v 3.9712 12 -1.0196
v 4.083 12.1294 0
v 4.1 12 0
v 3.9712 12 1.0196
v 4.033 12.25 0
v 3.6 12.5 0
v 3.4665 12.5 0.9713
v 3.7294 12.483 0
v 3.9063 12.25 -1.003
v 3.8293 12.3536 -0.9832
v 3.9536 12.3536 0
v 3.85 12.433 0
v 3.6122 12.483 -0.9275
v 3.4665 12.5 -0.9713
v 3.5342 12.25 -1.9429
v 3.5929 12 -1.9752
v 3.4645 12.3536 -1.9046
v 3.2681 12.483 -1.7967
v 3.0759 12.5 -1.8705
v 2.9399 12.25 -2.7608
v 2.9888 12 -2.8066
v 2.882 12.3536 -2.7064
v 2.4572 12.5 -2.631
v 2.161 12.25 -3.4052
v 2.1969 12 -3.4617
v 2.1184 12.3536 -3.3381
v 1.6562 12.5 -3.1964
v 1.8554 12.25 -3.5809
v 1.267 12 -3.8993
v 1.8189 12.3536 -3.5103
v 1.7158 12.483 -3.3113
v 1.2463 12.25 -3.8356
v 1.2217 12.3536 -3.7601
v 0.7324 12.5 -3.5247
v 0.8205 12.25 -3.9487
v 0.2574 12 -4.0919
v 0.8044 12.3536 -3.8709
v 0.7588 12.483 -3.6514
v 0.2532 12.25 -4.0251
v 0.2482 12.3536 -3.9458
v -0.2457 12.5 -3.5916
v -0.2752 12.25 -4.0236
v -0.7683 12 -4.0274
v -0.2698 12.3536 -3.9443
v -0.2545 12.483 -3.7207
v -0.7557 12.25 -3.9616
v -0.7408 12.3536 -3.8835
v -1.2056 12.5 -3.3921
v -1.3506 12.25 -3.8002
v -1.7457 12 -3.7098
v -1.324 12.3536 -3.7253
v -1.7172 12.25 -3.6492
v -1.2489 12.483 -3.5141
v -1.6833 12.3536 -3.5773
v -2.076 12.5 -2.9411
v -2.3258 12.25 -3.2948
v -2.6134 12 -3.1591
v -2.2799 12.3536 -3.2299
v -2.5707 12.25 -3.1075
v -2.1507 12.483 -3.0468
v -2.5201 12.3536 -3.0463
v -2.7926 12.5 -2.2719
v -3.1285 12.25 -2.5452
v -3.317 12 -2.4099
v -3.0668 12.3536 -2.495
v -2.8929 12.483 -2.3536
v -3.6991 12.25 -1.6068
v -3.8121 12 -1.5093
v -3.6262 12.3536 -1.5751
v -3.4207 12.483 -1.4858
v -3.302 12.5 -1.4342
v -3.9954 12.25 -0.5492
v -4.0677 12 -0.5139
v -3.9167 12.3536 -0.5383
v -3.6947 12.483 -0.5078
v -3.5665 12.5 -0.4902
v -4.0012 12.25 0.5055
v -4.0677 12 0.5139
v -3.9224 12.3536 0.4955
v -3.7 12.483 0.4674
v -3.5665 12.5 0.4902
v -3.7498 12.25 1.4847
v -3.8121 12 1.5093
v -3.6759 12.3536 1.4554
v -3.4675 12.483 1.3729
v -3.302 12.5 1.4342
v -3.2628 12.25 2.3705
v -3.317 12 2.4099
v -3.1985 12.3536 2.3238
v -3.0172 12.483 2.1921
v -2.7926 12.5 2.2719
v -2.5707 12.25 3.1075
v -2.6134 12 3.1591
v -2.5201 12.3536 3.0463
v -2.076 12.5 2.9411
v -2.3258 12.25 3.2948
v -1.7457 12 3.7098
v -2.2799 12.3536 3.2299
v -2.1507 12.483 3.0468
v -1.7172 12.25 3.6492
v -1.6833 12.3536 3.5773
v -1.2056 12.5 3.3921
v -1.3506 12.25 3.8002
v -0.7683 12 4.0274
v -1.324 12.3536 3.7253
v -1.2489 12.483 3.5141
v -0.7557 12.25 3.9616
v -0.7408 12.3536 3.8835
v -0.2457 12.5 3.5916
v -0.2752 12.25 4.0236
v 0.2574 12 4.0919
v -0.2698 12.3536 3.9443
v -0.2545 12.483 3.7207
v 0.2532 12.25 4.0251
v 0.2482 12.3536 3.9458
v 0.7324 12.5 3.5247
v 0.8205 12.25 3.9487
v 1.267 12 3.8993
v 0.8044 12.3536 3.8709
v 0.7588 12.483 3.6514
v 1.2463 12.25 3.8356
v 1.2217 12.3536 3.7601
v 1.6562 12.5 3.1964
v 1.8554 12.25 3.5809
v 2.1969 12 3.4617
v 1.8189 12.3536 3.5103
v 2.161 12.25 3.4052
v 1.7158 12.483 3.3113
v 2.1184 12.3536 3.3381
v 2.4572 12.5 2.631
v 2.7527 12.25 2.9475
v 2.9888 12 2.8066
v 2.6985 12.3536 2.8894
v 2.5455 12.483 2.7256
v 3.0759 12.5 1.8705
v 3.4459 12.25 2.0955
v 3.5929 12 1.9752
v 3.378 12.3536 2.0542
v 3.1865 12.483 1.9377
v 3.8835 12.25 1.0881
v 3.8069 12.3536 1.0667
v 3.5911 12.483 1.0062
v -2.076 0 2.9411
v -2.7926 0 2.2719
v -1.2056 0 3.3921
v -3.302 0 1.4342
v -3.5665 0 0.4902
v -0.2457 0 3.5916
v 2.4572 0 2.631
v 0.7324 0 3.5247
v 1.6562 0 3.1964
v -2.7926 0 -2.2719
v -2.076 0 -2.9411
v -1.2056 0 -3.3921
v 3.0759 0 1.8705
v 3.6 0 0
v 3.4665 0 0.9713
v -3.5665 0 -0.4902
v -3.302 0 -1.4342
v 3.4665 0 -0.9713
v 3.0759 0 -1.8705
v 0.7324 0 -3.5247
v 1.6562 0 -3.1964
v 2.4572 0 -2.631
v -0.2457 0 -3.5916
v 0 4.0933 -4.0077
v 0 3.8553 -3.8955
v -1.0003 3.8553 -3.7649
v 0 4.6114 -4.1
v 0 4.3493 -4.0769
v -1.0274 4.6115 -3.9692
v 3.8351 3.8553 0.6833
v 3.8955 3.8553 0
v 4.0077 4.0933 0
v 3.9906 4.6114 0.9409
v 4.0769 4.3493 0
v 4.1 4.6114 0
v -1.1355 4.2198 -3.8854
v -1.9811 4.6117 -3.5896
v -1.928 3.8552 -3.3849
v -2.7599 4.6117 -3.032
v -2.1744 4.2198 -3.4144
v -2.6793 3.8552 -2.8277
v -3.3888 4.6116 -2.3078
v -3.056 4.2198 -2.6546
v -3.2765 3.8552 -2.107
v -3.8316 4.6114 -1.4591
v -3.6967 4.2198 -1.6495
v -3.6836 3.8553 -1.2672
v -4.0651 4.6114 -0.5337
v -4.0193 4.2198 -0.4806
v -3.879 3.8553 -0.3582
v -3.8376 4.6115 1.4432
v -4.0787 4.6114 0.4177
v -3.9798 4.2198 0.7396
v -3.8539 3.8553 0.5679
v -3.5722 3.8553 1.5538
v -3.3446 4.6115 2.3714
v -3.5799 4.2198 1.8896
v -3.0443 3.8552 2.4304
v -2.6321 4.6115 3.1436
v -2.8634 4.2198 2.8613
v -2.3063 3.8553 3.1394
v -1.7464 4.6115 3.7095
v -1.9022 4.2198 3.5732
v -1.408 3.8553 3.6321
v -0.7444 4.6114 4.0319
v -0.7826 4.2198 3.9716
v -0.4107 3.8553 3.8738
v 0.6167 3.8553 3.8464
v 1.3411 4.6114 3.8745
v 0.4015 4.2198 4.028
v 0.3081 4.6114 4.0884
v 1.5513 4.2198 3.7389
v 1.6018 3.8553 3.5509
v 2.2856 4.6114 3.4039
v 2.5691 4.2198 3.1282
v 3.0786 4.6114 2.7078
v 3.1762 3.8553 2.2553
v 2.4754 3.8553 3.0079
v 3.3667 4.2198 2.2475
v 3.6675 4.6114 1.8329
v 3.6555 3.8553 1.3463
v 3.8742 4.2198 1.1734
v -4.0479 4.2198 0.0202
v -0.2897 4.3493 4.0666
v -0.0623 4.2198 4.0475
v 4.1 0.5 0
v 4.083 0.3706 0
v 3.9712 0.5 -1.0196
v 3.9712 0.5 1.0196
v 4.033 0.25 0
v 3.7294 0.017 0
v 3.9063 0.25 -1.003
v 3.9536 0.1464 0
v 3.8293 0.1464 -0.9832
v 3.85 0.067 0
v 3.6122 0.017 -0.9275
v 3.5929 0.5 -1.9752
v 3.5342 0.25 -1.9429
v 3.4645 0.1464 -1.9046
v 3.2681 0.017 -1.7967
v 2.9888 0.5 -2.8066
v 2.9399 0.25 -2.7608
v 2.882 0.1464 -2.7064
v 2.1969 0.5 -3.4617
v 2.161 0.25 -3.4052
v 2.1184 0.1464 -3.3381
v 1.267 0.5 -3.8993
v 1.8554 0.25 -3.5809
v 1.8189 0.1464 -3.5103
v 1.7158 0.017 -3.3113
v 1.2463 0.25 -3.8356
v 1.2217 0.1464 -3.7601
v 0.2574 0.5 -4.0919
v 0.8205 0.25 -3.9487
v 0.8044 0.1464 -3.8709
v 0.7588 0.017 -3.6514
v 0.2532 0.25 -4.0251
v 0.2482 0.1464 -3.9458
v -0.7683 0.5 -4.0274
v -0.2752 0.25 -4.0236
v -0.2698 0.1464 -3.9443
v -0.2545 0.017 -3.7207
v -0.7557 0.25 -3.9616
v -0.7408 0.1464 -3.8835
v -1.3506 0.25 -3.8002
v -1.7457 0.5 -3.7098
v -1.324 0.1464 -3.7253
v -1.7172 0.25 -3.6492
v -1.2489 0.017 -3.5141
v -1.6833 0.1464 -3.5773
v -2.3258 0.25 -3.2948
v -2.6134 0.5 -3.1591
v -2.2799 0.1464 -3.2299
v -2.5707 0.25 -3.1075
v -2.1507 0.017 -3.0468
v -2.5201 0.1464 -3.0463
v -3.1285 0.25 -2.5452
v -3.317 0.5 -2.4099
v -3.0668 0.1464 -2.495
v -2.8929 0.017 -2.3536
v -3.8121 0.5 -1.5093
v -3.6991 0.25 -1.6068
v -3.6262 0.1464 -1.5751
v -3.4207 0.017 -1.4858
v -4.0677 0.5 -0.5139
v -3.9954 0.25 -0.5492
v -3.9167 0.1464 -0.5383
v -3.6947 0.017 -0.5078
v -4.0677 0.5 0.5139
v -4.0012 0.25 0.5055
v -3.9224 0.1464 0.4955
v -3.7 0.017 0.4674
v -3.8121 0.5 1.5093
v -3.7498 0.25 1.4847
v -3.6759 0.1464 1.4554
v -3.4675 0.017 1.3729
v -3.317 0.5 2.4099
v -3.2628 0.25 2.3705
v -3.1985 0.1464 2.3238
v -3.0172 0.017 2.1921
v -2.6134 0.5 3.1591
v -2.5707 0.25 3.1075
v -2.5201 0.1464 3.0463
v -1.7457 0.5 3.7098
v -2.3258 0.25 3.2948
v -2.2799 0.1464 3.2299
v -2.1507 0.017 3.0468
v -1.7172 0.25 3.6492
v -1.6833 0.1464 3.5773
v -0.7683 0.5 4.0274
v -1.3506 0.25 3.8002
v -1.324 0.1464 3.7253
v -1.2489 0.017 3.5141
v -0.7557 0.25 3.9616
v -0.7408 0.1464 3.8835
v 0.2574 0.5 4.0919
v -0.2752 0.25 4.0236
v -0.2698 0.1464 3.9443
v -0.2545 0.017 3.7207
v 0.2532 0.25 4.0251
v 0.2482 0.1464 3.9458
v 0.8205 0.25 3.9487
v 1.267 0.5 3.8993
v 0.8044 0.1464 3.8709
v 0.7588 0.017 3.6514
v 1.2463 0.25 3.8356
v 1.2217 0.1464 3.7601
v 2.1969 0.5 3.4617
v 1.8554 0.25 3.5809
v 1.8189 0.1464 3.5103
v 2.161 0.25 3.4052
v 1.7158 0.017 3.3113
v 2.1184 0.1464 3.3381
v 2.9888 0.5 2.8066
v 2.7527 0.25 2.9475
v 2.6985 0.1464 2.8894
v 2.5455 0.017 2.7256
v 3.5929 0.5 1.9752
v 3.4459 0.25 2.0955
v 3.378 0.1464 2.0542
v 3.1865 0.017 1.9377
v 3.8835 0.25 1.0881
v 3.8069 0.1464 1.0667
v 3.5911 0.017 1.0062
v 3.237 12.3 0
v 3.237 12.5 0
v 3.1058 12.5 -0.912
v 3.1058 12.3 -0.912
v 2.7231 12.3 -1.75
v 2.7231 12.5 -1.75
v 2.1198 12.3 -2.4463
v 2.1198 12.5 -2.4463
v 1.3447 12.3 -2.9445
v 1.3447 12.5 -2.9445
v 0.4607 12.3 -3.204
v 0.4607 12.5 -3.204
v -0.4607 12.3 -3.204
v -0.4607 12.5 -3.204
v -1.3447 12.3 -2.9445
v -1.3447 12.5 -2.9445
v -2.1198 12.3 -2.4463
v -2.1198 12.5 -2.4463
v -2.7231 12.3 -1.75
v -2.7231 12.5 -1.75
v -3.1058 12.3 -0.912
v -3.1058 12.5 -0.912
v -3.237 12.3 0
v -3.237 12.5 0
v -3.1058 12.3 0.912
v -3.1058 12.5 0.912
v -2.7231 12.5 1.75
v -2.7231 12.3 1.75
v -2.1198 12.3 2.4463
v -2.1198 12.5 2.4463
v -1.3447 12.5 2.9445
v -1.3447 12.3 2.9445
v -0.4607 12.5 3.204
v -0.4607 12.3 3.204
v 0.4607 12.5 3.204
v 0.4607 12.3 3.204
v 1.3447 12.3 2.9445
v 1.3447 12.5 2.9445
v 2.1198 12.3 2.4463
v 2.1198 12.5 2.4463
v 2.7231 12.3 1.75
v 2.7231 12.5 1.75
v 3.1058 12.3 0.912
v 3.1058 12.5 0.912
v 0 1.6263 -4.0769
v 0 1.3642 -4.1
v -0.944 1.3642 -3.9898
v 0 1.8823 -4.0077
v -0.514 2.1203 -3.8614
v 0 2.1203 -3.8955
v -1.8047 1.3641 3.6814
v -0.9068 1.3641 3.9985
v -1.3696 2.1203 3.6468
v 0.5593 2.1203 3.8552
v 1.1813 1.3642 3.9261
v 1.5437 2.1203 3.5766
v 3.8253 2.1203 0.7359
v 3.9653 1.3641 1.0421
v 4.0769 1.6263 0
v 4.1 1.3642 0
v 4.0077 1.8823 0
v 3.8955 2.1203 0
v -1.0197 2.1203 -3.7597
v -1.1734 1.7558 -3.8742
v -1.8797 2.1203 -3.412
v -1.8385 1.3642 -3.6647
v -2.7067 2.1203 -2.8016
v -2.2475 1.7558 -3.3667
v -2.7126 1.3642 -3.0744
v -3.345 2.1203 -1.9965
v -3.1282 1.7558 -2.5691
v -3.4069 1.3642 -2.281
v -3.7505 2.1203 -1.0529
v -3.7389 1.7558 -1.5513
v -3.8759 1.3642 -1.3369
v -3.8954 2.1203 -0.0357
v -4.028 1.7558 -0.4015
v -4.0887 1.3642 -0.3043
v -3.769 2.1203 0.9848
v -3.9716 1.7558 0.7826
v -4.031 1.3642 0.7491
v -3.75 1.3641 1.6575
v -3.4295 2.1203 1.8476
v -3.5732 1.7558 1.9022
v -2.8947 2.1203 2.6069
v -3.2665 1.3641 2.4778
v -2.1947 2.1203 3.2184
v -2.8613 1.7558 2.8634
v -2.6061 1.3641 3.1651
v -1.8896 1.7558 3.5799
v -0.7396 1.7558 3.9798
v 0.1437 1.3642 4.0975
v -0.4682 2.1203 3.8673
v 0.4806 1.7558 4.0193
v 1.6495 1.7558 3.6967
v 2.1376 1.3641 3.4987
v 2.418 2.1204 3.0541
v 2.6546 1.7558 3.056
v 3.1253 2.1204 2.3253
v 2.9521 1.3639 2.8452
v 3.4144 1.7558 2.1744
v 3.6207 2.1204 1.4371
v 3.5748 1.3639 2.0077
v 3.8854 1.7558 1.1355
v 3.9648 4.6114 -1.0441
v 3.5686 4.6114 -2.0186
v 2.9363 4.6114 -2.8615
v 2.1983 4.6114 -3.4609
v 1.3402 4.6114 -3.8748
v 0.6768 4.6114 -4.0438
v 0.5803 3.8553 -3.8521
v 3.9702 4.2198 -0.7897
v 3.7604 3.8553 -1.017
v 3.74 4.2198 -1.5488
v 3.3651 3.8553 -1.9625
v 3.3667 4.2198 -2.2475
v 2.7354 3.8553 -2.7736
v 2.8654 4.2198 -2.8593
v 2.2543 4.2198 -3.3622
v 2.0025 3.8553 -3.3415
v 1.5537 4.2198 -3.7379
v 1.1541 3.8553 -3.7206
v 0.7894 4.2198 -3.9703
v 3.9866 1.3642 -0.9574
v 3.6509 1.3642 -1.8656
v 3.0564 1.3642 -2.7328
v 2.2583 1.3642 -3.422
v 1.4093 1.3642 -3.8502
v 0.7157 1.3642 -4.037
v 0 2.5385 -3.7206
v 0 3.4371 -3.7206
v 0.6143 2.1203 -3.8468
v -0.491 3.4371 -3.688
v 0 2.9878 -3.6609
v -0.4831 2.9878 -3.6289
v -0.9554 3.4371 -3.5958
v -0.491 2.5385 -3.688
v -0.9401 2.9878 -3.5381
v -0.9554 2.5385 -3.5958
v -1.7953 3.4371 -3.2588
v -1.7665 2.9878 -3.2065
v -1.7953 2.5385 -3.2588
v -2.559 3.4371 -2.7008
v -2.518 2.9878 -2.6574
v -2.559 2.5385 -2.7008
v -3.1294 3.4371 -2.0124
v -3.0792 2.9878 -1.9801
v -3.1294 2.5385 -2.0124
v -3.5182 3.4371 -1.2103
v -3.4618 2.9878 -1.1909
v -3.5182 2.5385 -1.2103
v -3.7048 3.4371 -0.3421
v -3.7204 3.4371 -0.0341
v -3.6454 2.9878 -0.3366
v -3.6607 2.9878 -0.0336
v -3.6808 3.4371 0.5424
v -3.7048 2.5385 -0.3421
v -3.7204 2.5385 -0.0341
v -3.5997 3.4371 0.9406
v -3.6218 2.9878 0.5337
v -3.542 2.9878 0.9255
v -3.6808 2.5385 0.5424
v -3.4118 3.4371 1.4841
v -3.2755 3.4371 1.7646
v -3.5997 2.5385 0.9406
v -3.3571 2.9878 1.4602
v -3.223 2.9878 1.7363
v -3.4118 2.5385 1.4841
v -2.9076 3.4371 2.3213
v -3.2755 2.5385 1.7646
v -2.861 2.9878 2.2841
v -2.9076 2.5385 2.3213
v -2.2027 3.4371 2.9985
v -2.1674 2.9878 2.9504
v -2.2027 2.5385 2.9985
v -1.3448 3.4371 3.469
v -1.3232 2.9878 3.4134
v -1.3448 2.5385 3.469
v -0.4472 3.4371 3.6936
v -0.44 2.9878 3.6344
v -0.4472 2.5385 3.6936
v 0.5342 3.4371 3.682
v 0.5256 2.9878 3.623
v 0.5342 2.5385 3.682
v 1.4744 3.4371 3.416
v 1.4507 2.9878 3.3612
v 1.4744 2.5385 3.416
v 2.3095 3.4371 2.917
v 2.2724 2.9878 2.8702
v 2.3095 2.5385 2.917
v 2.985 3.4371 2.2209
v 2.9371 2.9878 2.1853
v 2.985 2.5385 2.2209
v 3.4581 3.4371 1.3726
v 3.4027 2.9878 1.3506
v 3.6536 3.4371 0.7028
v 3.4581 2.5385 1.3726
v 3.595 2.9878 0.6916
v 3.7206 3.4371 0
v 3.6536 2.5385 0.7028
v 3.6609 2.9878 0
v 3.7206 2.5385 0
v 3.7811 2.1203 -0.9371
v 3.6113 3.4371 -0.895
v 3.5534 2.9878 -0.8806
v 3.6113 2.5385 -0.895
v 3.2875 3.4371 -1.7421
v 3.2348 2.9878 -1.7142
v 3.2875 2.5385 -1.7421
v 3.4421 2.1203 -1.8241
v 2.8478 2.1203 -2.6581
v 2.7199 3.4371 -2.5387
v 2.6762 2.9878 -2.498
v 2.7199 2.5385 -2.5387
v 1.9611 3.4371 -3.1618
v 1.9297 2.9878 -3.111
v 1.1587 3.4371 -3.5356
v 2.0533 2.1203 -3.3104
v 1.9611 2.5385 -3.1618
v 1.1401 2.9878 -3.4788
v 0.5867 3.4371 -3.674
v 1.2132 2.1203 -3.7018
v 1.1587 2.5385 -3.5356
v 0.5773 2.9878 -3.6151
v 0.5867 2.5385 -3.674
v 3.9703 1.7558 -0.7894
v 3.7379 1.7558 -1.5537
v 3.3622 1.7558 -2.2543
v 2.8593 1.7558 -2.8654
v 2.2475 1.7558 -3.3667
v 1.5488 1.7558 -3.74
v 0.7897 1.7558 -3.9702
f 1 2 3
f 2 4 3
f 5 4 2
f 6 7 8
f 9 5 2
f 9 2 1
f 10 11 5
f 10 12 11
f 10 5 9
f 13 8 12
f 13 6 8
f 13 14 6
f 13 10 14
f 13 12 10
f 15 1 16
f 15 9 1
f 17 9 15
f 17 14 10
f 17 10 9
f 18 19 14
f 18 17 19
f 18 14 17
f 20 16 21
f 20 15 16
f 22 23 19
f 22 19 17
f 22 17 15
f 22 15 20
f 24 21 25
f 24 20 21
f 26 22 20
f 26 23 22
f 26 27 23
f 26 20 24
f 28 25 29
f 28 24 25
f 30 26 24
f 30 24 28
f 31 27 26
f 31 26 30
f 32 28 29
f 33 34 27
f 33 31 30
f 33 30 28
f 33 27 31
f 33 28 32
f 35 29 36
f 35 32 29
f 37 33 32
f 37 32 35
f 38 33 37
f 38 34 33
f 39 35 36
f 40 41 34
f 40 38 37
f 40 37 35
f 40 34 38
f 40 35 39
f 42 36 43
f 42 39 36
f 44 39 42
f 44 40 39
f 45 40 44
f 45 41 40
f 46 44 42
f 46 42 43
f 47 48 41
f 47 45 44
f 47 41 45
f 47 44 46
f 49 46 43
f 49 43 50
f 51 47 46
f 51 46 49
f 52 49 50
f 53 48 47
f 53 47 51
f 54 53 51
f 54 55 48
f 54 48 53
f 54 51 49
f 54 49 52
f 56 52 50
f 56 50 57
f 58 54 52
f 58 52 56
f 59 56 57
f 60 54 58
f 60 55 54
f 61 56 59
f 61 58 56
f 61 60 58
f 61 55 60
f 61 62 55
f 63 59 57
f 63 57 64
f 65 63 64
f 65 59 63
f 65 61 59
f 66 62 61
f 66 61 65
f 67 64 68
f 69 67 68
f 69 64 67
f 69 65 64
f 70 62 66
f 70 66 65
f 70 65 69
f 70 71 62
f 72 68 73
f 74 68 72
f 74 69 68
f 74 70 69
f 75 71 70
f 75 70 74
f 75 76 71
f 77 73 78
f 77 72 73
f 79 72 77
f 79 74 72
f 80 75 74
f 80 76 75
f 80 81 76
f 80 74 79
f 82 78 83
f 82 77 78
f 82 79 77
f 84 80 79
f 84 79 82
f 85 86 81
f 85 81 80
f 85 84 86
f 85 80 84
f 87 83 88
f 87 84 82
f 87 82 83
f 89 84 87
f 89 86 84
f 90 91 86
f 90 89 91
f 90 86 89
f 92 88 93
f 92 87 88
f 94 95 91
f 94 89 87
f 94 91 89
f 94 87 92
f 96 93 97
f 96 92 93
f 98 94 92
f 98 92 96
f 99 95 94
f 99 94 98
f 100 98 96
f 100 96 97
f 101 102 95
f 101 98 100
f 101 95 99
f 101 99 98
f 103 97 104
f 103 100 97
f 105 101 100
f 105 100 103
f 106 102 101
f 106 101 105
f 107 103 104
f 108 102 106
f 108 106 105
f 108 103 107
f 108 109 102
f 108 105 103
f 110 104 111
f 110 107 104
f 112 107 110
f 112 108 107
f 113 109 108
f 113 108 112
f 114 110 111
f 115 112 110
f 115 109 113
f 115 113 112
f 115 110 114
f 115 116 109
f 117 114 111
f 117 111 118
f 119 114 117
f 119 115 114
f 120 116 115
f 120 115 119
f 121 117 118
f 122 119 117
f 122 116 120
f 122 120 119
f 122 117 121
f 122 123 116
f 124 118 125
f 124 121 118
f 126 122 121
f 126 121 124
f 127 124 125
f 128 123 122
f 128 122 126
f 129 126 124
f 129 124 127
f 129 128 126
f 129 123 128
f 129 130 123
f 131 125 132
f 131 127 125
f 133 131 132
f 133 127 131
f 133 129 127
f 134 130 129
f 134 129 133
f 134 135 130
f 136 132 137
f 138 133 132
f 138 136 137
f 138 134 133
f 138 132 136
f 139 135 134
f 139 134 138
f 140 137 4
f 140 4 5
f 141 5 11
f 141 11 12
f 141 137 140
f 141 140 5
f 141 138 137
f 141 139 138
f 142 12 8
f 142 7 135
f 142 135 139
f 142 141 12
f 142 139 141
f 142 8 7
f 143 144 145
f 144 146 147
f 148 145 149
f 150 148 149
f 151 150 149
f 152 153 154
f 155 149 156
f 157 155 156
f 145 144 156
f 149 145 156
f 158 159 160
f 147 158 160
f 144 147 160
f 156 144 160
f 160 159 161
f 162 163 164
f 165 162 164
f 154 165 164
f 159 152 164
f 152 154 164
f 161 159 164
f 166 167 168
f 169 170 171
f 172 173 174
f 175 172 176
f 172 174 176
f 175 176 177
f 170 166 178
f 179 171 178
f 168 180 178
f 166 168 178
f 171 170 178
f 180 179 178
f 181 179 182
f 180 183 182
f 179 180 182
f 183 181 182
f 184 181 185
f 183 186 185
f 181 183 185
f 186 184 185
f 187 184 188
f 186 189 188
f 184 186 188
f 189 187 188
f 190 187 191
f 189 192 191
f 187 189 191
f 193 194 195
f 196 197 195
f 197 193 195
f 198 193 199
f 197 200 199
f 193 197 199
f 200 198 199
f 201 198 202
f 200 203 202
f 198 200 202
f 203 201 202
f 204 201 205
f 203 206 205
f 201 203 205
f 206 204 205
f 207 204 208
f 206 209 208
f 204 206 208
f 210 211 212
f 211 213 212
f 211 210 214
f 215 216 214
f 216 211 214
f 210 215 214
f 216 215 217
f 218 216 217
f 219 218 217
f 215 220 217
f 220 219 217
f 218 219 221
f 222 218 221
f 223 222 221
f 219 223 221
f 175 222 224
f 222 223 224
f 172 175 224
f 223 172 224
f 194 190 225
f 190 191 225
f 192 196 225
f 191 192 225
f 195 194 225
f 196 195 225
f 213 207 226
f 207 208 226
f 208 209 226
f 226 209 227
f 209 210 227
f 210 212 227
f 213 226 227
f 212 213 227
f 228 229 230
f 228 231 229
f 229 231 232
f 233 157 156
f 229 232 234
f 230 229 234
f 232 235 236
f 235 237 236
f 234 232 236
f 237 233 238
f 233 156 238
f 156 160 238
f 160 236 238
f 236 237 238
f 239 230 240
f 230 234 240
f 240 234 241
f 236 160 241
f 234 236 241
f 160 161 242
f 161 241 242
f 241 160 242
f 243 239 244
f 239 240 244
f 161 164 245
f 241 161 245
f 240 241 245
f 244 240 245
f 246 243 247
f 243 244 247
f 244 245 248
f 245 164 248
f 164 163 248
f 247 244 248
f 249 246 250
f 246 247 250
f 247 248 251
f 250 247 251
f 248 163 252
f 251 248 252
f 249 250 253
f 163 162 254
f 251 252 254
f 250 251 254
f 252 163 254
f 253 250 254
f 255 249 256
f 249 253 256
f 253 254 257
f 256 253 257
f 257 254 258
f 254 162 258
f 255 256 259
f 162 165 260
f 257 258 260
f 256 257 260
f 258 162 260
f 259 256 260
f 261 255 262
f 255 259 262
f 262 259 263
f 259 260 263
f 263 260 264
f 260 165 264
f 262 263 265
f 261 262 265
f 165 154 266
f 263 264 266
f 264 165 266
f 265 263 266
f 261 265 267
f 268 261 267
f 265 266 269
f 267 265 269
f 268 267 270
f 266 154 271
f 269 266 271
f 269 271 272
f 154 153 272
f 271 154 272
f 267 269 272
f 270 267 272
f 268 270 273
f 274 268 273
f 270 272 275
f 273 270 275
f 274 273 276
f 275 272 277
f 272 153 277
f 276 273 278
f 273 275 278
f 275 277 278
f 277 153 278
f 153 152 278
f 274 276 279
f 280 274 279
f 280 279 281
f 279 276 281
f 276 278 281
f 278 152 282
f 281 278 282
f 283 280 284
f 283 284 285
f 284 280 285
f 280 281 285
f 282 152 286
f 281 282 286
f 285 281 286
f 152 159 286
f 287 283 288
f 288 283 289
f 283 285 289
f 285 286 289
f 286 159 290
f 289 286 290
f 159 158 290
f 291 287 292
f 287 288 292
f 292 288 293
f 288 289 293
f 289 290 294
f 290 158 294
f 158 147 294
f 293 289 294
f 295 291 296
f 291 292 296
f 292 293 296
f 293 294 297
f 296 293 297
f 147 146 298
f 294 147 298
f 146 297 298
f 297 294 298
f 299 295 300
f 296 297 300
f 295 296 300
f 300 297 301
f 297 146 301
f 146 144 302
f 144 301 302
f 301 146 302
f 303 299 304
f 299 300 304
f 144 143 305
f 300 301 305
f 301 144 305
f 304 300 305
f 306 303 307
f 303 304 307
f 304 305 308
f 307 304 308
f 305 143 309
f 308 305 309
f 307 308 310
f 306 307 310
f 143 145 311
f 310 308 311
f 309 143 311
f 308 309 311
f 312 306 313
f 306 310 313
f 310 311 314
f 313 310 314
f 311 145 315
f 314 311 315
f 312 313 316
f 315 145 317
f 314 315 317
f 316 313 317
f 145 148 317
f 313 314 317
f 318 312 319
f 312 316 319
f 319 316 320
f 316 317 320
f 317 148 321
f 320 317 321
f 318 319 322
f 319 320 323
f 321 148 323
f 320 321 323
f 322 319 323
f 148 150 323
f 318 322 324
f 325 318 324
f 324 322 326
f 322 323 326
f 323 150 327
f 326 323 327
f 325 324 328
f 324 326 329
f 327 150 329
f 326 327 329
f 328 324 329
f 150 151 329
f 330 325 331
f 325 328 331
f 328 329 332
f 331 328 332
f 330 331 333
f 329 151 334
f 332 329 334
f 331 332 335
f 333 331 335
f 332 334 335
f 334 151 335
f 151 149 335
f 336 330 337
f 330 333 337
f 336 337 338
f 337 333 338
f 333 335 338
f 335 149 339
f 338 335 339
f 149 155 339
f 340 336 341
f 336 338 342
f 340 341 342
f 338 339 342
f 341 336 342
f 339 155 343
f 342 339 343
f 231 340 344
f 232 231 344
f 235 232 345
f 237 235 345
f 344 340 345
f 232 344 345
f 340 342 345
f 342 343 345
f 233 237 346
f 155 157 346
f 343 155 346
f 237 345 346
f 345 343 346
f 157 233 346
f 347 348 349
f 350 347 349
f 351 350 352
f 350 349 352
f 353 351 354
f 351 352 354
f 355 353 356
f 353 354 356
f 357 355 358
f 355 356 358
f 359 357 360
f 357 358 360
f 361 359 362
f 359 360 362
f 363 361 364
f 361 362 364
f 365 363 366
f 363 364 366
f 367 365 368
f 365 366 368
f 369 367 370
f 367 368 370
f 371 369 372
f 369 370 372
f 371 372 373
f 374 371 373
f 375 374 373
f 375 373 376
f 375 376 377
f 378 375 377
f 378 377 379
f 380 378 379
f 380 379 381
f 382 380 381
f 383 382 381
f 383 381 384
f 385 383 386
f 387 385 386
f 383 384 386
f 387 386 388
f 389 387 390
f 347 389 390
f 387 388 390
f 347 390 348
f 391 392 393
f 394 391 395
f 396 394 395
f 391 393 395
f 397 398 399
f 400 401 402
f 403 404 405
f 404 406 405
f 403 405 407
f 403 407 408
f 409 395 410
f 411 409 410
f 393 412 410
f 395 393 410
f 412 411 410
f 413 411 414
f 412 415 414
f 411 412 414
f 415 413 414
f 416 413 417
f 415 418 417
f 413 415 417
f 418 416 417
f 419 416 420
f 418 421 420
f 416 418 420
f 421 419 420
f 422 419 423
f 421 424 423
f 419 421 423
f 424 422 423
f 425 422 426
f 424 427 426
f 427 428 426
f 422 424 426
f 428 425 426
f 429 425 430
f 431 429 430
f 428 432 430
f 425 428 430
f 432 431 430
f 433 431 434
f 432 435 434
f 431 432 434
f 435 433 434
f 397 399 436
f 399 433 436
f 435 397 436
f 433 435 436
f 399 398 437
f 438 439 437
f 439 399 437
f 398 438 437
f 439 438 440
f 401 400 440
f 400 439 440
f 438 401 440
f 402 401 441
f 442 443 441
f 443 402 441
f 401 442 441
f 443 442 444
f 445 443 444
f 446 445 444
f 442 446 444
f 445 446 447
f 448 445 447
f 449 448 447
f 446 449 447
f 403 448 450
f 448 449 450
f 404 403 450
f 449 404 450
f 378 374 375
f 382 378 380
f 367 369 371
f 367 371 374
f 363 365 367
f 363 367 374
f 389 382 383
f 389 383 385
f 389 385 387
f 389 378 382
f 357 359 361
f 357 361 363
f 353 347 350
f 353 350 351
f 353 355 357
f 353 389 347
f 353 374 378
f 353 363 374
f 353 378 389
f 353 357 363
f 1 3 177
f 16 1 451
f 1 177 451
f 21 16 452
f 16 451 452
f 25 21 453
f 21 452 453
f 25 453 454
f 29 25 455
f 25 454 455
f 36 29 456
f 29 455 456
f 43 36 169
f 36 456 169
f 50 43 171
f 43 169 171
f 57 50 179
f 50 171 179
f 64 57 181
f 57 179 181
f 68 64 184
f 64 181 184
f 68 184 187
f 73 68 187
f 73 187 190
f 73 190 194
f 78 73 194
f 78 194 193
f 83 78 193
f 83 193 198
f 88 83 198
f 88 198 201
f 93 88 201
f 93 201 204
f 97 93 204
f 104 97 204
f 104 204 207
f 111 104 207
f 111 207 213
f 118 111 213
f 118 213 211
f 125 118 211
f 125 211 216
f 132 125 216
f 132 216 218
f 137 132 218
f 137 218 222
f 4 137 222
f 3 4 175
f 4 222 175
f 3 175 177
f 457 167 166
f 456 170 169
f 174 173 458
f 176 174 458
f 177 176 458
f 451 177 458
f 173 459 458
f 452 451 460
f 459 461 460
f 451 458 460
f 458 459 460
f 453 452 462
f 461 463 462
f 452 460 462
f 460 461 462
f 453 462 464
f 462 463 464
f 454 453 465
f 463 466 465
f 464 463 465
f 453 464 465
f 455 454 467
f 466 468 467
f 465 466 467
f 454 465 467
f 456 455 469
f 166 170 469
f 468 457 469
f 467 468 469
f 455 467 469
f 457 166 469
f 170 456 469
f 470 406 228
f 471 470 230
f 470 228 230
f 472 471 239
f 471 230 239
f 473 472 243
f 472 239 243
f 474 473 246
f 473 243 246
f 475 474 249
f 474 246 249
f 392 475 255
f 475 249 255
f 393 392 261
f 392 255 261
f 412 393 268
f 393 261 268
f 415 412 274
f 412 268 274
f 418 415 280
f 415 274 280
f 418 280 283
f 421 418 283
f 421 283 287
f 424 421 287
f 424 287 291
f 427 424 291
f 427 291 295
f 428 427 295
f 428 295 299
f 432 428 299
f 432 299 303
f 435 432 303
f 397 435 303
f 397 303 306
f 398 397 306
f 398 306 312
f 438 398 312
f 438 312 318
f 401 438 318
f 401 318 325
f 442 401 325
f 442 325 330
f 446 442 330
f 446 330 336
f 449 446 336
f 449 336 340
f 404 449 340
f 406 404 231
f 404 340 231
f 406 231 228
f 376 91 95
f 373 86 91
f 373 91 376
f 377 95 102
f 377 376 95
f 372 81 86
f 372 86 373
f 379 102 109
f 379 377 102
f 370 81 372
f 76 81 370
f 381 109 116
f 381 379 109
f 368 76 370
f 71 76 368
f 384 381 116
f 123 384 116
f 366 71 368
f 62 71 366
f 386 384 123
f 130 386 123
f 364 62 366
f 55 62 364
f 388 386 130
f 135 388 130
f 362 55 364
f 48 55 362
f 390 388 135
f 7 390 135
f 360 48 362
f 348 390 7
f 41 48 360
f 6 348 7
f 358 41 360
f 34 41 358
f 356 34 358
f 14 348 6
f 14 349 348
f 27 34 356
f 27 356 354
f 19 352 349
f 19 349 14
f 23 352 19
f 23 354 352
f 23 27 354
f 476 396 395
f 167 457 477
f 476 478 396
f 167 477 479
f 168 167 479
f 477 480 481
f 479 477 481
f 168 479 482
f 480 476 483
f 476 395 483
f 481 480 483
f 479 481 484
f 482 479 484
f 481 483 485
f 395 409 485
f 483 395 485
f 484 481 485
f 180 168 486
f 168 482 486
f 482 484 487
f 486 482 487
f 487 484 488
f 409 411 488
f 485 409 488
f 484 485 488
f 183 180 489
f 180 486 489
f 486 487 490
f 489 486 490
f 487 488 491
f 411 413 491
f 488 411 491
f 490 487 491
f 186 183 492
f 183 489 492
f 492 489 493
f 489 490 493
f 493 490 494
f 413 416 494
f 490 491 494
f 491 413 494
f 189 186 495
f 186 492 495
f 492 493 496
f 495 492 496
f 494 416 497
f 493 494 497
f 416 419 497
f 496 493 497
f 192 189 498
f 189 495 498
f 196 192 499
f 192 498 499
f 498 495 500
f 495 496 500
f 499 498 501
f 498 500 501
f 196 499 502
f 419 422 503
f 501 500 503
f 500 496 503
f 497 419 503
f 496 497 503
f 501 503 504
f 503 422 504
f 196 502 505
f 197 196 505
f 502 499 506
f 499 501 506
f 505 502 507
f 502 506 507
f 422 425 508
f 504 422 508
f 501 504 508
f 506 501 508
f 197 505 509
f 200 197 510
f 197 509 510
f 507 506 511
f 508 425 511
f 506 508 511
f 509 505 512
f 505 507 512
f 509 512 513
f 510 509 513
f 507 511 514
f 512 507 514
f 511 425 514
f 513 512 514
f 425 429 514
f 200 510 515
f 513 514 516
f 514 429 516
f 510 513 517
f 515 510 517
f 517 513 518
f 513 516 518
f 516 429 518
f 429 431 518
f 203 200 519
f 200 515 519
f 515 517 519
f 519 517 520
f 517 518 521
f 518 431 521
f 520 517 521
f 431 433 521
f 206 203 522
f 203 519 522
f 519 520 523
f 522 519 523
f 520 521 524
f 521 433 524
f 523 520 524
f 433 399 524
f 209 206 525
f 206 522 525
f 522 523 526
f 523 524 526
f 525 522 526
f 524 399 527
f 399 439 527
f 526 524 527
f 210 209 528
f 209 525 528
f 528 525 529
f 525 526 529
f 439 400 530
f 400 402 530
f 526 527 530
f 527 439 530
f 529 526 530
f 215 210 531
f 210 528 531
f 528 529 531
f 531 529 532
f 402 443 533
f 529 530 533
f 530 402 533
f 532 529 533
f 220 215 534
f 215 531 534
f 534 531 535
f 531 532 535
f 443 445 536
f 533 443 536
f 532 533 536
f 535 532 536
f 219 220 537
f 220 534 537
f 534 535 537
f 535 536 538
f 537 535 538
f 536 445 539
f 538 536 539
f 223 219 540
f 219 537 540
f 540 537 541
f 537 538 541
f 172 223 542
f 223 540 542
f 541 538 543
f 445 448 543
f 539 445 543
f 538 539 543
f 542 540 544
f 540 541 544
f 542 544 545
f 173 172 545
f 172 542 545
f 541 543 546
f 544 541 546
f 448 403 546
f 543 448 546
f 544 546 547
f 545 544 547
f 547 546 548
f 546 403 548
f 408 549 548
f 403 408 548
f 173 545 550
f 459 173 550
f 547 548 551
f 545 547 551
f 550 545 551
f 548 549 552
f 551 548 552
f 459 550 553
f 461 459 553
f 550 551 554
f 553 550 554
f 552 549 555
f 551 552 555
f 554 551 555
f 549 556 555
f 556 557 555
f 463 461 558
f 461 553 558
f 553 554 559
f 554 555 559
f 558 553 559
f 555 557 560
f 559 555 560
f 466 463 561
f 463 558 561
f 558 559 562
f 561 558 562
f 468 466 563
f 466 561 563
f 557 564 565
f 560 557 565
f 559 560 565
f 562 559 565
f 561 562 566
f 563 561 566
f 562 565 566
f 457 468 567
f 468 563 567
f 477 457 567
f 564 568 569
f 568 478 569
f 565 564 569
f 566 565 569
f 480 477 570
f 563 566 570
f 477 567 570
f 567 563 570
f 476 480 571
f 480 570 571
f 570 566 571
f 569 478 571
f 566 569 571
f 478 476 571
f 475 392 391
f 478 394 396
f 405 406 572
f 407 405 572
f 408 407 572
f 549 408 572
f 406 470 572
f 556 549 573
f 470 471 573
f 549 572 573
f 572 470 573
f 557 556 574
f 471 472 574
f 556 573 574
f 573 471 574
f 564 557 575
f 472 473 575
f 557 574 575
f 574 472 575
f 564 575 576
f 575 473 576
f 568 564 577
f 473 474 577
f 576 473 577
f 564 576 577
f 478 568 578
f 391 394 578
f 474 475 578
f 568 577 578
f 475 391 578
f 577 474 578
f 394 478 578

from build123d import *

# Parameters (mm, degrees)
CROQUIS1_R            = 4.1
EXTRUIR1_DEPTH        = 12.5
CROQUIS2_R            = 1.721107575
REDONDEO1_R           = 0.5
REDONDEO2_R           = 1.5
CROQUIS3_R            = 3.23696878
CORTAR_EXTRUIR1_DEPTH = 0.2


with BuildPart() as part:
    # Croquis1 → Extruir1 (new body)
    with BuildSketch(Plane(origin=(0, 0, 0), x_dir=(1, 0, 0), z_dir=(0, 1, 0))):
        Circle(CROQUIS1_R)
    extrude(amount=EXTRUIR1_DEPTH)

    # Croquis2 → Cortar-Revolución1 (revolve, cut)
    with BuildSketch(Plane(origin=(0, 0, 0), x_dir=(0, 0, -1), z_dir=(1, 0, 0))):
        with Locations((5.382002142, 2.987795872)):
            Circle(CROQUIS2_R)
    revolve(axis=Axis((0, 12.5, 0), (0, 1, 0)), mode=Mode.SUBTRACT)

    # Redondeo1
    redondeo1_edges = [part.edges().sort_by_distance(p)[0] for p in [
        (-4.1, 0, 0),
        (-4.1, 12.5, 0),
    ]]
    fillet(redondeo1_edges, radius=REDONDEO1_R)

    # Redondeo2
    redondeo2_edges = [part.edges().sort_by_distance(p)[0] for p in [
        (2.899137803, 4.136134582, -2.899137803),
        (-2.899137803, 1.839457161, 2.899137803),
    ]]
    fillet(redondeo2_edges, radius=REDONDEO2_R)

    # Croquis3 → Cortar-Extruir1 (cut)
    with BuildSketch(Plane(origin=(0, 12.5, 0), x_dir=(1, 0, 0), z_dir=(0, 1, 0))):
        Circle(CROQUIS3_R)
    extrude(amount=-CORTAR_EXTRUIR1_DEPTH, mode=Mode.SUBTRACT)


solid = part.part
